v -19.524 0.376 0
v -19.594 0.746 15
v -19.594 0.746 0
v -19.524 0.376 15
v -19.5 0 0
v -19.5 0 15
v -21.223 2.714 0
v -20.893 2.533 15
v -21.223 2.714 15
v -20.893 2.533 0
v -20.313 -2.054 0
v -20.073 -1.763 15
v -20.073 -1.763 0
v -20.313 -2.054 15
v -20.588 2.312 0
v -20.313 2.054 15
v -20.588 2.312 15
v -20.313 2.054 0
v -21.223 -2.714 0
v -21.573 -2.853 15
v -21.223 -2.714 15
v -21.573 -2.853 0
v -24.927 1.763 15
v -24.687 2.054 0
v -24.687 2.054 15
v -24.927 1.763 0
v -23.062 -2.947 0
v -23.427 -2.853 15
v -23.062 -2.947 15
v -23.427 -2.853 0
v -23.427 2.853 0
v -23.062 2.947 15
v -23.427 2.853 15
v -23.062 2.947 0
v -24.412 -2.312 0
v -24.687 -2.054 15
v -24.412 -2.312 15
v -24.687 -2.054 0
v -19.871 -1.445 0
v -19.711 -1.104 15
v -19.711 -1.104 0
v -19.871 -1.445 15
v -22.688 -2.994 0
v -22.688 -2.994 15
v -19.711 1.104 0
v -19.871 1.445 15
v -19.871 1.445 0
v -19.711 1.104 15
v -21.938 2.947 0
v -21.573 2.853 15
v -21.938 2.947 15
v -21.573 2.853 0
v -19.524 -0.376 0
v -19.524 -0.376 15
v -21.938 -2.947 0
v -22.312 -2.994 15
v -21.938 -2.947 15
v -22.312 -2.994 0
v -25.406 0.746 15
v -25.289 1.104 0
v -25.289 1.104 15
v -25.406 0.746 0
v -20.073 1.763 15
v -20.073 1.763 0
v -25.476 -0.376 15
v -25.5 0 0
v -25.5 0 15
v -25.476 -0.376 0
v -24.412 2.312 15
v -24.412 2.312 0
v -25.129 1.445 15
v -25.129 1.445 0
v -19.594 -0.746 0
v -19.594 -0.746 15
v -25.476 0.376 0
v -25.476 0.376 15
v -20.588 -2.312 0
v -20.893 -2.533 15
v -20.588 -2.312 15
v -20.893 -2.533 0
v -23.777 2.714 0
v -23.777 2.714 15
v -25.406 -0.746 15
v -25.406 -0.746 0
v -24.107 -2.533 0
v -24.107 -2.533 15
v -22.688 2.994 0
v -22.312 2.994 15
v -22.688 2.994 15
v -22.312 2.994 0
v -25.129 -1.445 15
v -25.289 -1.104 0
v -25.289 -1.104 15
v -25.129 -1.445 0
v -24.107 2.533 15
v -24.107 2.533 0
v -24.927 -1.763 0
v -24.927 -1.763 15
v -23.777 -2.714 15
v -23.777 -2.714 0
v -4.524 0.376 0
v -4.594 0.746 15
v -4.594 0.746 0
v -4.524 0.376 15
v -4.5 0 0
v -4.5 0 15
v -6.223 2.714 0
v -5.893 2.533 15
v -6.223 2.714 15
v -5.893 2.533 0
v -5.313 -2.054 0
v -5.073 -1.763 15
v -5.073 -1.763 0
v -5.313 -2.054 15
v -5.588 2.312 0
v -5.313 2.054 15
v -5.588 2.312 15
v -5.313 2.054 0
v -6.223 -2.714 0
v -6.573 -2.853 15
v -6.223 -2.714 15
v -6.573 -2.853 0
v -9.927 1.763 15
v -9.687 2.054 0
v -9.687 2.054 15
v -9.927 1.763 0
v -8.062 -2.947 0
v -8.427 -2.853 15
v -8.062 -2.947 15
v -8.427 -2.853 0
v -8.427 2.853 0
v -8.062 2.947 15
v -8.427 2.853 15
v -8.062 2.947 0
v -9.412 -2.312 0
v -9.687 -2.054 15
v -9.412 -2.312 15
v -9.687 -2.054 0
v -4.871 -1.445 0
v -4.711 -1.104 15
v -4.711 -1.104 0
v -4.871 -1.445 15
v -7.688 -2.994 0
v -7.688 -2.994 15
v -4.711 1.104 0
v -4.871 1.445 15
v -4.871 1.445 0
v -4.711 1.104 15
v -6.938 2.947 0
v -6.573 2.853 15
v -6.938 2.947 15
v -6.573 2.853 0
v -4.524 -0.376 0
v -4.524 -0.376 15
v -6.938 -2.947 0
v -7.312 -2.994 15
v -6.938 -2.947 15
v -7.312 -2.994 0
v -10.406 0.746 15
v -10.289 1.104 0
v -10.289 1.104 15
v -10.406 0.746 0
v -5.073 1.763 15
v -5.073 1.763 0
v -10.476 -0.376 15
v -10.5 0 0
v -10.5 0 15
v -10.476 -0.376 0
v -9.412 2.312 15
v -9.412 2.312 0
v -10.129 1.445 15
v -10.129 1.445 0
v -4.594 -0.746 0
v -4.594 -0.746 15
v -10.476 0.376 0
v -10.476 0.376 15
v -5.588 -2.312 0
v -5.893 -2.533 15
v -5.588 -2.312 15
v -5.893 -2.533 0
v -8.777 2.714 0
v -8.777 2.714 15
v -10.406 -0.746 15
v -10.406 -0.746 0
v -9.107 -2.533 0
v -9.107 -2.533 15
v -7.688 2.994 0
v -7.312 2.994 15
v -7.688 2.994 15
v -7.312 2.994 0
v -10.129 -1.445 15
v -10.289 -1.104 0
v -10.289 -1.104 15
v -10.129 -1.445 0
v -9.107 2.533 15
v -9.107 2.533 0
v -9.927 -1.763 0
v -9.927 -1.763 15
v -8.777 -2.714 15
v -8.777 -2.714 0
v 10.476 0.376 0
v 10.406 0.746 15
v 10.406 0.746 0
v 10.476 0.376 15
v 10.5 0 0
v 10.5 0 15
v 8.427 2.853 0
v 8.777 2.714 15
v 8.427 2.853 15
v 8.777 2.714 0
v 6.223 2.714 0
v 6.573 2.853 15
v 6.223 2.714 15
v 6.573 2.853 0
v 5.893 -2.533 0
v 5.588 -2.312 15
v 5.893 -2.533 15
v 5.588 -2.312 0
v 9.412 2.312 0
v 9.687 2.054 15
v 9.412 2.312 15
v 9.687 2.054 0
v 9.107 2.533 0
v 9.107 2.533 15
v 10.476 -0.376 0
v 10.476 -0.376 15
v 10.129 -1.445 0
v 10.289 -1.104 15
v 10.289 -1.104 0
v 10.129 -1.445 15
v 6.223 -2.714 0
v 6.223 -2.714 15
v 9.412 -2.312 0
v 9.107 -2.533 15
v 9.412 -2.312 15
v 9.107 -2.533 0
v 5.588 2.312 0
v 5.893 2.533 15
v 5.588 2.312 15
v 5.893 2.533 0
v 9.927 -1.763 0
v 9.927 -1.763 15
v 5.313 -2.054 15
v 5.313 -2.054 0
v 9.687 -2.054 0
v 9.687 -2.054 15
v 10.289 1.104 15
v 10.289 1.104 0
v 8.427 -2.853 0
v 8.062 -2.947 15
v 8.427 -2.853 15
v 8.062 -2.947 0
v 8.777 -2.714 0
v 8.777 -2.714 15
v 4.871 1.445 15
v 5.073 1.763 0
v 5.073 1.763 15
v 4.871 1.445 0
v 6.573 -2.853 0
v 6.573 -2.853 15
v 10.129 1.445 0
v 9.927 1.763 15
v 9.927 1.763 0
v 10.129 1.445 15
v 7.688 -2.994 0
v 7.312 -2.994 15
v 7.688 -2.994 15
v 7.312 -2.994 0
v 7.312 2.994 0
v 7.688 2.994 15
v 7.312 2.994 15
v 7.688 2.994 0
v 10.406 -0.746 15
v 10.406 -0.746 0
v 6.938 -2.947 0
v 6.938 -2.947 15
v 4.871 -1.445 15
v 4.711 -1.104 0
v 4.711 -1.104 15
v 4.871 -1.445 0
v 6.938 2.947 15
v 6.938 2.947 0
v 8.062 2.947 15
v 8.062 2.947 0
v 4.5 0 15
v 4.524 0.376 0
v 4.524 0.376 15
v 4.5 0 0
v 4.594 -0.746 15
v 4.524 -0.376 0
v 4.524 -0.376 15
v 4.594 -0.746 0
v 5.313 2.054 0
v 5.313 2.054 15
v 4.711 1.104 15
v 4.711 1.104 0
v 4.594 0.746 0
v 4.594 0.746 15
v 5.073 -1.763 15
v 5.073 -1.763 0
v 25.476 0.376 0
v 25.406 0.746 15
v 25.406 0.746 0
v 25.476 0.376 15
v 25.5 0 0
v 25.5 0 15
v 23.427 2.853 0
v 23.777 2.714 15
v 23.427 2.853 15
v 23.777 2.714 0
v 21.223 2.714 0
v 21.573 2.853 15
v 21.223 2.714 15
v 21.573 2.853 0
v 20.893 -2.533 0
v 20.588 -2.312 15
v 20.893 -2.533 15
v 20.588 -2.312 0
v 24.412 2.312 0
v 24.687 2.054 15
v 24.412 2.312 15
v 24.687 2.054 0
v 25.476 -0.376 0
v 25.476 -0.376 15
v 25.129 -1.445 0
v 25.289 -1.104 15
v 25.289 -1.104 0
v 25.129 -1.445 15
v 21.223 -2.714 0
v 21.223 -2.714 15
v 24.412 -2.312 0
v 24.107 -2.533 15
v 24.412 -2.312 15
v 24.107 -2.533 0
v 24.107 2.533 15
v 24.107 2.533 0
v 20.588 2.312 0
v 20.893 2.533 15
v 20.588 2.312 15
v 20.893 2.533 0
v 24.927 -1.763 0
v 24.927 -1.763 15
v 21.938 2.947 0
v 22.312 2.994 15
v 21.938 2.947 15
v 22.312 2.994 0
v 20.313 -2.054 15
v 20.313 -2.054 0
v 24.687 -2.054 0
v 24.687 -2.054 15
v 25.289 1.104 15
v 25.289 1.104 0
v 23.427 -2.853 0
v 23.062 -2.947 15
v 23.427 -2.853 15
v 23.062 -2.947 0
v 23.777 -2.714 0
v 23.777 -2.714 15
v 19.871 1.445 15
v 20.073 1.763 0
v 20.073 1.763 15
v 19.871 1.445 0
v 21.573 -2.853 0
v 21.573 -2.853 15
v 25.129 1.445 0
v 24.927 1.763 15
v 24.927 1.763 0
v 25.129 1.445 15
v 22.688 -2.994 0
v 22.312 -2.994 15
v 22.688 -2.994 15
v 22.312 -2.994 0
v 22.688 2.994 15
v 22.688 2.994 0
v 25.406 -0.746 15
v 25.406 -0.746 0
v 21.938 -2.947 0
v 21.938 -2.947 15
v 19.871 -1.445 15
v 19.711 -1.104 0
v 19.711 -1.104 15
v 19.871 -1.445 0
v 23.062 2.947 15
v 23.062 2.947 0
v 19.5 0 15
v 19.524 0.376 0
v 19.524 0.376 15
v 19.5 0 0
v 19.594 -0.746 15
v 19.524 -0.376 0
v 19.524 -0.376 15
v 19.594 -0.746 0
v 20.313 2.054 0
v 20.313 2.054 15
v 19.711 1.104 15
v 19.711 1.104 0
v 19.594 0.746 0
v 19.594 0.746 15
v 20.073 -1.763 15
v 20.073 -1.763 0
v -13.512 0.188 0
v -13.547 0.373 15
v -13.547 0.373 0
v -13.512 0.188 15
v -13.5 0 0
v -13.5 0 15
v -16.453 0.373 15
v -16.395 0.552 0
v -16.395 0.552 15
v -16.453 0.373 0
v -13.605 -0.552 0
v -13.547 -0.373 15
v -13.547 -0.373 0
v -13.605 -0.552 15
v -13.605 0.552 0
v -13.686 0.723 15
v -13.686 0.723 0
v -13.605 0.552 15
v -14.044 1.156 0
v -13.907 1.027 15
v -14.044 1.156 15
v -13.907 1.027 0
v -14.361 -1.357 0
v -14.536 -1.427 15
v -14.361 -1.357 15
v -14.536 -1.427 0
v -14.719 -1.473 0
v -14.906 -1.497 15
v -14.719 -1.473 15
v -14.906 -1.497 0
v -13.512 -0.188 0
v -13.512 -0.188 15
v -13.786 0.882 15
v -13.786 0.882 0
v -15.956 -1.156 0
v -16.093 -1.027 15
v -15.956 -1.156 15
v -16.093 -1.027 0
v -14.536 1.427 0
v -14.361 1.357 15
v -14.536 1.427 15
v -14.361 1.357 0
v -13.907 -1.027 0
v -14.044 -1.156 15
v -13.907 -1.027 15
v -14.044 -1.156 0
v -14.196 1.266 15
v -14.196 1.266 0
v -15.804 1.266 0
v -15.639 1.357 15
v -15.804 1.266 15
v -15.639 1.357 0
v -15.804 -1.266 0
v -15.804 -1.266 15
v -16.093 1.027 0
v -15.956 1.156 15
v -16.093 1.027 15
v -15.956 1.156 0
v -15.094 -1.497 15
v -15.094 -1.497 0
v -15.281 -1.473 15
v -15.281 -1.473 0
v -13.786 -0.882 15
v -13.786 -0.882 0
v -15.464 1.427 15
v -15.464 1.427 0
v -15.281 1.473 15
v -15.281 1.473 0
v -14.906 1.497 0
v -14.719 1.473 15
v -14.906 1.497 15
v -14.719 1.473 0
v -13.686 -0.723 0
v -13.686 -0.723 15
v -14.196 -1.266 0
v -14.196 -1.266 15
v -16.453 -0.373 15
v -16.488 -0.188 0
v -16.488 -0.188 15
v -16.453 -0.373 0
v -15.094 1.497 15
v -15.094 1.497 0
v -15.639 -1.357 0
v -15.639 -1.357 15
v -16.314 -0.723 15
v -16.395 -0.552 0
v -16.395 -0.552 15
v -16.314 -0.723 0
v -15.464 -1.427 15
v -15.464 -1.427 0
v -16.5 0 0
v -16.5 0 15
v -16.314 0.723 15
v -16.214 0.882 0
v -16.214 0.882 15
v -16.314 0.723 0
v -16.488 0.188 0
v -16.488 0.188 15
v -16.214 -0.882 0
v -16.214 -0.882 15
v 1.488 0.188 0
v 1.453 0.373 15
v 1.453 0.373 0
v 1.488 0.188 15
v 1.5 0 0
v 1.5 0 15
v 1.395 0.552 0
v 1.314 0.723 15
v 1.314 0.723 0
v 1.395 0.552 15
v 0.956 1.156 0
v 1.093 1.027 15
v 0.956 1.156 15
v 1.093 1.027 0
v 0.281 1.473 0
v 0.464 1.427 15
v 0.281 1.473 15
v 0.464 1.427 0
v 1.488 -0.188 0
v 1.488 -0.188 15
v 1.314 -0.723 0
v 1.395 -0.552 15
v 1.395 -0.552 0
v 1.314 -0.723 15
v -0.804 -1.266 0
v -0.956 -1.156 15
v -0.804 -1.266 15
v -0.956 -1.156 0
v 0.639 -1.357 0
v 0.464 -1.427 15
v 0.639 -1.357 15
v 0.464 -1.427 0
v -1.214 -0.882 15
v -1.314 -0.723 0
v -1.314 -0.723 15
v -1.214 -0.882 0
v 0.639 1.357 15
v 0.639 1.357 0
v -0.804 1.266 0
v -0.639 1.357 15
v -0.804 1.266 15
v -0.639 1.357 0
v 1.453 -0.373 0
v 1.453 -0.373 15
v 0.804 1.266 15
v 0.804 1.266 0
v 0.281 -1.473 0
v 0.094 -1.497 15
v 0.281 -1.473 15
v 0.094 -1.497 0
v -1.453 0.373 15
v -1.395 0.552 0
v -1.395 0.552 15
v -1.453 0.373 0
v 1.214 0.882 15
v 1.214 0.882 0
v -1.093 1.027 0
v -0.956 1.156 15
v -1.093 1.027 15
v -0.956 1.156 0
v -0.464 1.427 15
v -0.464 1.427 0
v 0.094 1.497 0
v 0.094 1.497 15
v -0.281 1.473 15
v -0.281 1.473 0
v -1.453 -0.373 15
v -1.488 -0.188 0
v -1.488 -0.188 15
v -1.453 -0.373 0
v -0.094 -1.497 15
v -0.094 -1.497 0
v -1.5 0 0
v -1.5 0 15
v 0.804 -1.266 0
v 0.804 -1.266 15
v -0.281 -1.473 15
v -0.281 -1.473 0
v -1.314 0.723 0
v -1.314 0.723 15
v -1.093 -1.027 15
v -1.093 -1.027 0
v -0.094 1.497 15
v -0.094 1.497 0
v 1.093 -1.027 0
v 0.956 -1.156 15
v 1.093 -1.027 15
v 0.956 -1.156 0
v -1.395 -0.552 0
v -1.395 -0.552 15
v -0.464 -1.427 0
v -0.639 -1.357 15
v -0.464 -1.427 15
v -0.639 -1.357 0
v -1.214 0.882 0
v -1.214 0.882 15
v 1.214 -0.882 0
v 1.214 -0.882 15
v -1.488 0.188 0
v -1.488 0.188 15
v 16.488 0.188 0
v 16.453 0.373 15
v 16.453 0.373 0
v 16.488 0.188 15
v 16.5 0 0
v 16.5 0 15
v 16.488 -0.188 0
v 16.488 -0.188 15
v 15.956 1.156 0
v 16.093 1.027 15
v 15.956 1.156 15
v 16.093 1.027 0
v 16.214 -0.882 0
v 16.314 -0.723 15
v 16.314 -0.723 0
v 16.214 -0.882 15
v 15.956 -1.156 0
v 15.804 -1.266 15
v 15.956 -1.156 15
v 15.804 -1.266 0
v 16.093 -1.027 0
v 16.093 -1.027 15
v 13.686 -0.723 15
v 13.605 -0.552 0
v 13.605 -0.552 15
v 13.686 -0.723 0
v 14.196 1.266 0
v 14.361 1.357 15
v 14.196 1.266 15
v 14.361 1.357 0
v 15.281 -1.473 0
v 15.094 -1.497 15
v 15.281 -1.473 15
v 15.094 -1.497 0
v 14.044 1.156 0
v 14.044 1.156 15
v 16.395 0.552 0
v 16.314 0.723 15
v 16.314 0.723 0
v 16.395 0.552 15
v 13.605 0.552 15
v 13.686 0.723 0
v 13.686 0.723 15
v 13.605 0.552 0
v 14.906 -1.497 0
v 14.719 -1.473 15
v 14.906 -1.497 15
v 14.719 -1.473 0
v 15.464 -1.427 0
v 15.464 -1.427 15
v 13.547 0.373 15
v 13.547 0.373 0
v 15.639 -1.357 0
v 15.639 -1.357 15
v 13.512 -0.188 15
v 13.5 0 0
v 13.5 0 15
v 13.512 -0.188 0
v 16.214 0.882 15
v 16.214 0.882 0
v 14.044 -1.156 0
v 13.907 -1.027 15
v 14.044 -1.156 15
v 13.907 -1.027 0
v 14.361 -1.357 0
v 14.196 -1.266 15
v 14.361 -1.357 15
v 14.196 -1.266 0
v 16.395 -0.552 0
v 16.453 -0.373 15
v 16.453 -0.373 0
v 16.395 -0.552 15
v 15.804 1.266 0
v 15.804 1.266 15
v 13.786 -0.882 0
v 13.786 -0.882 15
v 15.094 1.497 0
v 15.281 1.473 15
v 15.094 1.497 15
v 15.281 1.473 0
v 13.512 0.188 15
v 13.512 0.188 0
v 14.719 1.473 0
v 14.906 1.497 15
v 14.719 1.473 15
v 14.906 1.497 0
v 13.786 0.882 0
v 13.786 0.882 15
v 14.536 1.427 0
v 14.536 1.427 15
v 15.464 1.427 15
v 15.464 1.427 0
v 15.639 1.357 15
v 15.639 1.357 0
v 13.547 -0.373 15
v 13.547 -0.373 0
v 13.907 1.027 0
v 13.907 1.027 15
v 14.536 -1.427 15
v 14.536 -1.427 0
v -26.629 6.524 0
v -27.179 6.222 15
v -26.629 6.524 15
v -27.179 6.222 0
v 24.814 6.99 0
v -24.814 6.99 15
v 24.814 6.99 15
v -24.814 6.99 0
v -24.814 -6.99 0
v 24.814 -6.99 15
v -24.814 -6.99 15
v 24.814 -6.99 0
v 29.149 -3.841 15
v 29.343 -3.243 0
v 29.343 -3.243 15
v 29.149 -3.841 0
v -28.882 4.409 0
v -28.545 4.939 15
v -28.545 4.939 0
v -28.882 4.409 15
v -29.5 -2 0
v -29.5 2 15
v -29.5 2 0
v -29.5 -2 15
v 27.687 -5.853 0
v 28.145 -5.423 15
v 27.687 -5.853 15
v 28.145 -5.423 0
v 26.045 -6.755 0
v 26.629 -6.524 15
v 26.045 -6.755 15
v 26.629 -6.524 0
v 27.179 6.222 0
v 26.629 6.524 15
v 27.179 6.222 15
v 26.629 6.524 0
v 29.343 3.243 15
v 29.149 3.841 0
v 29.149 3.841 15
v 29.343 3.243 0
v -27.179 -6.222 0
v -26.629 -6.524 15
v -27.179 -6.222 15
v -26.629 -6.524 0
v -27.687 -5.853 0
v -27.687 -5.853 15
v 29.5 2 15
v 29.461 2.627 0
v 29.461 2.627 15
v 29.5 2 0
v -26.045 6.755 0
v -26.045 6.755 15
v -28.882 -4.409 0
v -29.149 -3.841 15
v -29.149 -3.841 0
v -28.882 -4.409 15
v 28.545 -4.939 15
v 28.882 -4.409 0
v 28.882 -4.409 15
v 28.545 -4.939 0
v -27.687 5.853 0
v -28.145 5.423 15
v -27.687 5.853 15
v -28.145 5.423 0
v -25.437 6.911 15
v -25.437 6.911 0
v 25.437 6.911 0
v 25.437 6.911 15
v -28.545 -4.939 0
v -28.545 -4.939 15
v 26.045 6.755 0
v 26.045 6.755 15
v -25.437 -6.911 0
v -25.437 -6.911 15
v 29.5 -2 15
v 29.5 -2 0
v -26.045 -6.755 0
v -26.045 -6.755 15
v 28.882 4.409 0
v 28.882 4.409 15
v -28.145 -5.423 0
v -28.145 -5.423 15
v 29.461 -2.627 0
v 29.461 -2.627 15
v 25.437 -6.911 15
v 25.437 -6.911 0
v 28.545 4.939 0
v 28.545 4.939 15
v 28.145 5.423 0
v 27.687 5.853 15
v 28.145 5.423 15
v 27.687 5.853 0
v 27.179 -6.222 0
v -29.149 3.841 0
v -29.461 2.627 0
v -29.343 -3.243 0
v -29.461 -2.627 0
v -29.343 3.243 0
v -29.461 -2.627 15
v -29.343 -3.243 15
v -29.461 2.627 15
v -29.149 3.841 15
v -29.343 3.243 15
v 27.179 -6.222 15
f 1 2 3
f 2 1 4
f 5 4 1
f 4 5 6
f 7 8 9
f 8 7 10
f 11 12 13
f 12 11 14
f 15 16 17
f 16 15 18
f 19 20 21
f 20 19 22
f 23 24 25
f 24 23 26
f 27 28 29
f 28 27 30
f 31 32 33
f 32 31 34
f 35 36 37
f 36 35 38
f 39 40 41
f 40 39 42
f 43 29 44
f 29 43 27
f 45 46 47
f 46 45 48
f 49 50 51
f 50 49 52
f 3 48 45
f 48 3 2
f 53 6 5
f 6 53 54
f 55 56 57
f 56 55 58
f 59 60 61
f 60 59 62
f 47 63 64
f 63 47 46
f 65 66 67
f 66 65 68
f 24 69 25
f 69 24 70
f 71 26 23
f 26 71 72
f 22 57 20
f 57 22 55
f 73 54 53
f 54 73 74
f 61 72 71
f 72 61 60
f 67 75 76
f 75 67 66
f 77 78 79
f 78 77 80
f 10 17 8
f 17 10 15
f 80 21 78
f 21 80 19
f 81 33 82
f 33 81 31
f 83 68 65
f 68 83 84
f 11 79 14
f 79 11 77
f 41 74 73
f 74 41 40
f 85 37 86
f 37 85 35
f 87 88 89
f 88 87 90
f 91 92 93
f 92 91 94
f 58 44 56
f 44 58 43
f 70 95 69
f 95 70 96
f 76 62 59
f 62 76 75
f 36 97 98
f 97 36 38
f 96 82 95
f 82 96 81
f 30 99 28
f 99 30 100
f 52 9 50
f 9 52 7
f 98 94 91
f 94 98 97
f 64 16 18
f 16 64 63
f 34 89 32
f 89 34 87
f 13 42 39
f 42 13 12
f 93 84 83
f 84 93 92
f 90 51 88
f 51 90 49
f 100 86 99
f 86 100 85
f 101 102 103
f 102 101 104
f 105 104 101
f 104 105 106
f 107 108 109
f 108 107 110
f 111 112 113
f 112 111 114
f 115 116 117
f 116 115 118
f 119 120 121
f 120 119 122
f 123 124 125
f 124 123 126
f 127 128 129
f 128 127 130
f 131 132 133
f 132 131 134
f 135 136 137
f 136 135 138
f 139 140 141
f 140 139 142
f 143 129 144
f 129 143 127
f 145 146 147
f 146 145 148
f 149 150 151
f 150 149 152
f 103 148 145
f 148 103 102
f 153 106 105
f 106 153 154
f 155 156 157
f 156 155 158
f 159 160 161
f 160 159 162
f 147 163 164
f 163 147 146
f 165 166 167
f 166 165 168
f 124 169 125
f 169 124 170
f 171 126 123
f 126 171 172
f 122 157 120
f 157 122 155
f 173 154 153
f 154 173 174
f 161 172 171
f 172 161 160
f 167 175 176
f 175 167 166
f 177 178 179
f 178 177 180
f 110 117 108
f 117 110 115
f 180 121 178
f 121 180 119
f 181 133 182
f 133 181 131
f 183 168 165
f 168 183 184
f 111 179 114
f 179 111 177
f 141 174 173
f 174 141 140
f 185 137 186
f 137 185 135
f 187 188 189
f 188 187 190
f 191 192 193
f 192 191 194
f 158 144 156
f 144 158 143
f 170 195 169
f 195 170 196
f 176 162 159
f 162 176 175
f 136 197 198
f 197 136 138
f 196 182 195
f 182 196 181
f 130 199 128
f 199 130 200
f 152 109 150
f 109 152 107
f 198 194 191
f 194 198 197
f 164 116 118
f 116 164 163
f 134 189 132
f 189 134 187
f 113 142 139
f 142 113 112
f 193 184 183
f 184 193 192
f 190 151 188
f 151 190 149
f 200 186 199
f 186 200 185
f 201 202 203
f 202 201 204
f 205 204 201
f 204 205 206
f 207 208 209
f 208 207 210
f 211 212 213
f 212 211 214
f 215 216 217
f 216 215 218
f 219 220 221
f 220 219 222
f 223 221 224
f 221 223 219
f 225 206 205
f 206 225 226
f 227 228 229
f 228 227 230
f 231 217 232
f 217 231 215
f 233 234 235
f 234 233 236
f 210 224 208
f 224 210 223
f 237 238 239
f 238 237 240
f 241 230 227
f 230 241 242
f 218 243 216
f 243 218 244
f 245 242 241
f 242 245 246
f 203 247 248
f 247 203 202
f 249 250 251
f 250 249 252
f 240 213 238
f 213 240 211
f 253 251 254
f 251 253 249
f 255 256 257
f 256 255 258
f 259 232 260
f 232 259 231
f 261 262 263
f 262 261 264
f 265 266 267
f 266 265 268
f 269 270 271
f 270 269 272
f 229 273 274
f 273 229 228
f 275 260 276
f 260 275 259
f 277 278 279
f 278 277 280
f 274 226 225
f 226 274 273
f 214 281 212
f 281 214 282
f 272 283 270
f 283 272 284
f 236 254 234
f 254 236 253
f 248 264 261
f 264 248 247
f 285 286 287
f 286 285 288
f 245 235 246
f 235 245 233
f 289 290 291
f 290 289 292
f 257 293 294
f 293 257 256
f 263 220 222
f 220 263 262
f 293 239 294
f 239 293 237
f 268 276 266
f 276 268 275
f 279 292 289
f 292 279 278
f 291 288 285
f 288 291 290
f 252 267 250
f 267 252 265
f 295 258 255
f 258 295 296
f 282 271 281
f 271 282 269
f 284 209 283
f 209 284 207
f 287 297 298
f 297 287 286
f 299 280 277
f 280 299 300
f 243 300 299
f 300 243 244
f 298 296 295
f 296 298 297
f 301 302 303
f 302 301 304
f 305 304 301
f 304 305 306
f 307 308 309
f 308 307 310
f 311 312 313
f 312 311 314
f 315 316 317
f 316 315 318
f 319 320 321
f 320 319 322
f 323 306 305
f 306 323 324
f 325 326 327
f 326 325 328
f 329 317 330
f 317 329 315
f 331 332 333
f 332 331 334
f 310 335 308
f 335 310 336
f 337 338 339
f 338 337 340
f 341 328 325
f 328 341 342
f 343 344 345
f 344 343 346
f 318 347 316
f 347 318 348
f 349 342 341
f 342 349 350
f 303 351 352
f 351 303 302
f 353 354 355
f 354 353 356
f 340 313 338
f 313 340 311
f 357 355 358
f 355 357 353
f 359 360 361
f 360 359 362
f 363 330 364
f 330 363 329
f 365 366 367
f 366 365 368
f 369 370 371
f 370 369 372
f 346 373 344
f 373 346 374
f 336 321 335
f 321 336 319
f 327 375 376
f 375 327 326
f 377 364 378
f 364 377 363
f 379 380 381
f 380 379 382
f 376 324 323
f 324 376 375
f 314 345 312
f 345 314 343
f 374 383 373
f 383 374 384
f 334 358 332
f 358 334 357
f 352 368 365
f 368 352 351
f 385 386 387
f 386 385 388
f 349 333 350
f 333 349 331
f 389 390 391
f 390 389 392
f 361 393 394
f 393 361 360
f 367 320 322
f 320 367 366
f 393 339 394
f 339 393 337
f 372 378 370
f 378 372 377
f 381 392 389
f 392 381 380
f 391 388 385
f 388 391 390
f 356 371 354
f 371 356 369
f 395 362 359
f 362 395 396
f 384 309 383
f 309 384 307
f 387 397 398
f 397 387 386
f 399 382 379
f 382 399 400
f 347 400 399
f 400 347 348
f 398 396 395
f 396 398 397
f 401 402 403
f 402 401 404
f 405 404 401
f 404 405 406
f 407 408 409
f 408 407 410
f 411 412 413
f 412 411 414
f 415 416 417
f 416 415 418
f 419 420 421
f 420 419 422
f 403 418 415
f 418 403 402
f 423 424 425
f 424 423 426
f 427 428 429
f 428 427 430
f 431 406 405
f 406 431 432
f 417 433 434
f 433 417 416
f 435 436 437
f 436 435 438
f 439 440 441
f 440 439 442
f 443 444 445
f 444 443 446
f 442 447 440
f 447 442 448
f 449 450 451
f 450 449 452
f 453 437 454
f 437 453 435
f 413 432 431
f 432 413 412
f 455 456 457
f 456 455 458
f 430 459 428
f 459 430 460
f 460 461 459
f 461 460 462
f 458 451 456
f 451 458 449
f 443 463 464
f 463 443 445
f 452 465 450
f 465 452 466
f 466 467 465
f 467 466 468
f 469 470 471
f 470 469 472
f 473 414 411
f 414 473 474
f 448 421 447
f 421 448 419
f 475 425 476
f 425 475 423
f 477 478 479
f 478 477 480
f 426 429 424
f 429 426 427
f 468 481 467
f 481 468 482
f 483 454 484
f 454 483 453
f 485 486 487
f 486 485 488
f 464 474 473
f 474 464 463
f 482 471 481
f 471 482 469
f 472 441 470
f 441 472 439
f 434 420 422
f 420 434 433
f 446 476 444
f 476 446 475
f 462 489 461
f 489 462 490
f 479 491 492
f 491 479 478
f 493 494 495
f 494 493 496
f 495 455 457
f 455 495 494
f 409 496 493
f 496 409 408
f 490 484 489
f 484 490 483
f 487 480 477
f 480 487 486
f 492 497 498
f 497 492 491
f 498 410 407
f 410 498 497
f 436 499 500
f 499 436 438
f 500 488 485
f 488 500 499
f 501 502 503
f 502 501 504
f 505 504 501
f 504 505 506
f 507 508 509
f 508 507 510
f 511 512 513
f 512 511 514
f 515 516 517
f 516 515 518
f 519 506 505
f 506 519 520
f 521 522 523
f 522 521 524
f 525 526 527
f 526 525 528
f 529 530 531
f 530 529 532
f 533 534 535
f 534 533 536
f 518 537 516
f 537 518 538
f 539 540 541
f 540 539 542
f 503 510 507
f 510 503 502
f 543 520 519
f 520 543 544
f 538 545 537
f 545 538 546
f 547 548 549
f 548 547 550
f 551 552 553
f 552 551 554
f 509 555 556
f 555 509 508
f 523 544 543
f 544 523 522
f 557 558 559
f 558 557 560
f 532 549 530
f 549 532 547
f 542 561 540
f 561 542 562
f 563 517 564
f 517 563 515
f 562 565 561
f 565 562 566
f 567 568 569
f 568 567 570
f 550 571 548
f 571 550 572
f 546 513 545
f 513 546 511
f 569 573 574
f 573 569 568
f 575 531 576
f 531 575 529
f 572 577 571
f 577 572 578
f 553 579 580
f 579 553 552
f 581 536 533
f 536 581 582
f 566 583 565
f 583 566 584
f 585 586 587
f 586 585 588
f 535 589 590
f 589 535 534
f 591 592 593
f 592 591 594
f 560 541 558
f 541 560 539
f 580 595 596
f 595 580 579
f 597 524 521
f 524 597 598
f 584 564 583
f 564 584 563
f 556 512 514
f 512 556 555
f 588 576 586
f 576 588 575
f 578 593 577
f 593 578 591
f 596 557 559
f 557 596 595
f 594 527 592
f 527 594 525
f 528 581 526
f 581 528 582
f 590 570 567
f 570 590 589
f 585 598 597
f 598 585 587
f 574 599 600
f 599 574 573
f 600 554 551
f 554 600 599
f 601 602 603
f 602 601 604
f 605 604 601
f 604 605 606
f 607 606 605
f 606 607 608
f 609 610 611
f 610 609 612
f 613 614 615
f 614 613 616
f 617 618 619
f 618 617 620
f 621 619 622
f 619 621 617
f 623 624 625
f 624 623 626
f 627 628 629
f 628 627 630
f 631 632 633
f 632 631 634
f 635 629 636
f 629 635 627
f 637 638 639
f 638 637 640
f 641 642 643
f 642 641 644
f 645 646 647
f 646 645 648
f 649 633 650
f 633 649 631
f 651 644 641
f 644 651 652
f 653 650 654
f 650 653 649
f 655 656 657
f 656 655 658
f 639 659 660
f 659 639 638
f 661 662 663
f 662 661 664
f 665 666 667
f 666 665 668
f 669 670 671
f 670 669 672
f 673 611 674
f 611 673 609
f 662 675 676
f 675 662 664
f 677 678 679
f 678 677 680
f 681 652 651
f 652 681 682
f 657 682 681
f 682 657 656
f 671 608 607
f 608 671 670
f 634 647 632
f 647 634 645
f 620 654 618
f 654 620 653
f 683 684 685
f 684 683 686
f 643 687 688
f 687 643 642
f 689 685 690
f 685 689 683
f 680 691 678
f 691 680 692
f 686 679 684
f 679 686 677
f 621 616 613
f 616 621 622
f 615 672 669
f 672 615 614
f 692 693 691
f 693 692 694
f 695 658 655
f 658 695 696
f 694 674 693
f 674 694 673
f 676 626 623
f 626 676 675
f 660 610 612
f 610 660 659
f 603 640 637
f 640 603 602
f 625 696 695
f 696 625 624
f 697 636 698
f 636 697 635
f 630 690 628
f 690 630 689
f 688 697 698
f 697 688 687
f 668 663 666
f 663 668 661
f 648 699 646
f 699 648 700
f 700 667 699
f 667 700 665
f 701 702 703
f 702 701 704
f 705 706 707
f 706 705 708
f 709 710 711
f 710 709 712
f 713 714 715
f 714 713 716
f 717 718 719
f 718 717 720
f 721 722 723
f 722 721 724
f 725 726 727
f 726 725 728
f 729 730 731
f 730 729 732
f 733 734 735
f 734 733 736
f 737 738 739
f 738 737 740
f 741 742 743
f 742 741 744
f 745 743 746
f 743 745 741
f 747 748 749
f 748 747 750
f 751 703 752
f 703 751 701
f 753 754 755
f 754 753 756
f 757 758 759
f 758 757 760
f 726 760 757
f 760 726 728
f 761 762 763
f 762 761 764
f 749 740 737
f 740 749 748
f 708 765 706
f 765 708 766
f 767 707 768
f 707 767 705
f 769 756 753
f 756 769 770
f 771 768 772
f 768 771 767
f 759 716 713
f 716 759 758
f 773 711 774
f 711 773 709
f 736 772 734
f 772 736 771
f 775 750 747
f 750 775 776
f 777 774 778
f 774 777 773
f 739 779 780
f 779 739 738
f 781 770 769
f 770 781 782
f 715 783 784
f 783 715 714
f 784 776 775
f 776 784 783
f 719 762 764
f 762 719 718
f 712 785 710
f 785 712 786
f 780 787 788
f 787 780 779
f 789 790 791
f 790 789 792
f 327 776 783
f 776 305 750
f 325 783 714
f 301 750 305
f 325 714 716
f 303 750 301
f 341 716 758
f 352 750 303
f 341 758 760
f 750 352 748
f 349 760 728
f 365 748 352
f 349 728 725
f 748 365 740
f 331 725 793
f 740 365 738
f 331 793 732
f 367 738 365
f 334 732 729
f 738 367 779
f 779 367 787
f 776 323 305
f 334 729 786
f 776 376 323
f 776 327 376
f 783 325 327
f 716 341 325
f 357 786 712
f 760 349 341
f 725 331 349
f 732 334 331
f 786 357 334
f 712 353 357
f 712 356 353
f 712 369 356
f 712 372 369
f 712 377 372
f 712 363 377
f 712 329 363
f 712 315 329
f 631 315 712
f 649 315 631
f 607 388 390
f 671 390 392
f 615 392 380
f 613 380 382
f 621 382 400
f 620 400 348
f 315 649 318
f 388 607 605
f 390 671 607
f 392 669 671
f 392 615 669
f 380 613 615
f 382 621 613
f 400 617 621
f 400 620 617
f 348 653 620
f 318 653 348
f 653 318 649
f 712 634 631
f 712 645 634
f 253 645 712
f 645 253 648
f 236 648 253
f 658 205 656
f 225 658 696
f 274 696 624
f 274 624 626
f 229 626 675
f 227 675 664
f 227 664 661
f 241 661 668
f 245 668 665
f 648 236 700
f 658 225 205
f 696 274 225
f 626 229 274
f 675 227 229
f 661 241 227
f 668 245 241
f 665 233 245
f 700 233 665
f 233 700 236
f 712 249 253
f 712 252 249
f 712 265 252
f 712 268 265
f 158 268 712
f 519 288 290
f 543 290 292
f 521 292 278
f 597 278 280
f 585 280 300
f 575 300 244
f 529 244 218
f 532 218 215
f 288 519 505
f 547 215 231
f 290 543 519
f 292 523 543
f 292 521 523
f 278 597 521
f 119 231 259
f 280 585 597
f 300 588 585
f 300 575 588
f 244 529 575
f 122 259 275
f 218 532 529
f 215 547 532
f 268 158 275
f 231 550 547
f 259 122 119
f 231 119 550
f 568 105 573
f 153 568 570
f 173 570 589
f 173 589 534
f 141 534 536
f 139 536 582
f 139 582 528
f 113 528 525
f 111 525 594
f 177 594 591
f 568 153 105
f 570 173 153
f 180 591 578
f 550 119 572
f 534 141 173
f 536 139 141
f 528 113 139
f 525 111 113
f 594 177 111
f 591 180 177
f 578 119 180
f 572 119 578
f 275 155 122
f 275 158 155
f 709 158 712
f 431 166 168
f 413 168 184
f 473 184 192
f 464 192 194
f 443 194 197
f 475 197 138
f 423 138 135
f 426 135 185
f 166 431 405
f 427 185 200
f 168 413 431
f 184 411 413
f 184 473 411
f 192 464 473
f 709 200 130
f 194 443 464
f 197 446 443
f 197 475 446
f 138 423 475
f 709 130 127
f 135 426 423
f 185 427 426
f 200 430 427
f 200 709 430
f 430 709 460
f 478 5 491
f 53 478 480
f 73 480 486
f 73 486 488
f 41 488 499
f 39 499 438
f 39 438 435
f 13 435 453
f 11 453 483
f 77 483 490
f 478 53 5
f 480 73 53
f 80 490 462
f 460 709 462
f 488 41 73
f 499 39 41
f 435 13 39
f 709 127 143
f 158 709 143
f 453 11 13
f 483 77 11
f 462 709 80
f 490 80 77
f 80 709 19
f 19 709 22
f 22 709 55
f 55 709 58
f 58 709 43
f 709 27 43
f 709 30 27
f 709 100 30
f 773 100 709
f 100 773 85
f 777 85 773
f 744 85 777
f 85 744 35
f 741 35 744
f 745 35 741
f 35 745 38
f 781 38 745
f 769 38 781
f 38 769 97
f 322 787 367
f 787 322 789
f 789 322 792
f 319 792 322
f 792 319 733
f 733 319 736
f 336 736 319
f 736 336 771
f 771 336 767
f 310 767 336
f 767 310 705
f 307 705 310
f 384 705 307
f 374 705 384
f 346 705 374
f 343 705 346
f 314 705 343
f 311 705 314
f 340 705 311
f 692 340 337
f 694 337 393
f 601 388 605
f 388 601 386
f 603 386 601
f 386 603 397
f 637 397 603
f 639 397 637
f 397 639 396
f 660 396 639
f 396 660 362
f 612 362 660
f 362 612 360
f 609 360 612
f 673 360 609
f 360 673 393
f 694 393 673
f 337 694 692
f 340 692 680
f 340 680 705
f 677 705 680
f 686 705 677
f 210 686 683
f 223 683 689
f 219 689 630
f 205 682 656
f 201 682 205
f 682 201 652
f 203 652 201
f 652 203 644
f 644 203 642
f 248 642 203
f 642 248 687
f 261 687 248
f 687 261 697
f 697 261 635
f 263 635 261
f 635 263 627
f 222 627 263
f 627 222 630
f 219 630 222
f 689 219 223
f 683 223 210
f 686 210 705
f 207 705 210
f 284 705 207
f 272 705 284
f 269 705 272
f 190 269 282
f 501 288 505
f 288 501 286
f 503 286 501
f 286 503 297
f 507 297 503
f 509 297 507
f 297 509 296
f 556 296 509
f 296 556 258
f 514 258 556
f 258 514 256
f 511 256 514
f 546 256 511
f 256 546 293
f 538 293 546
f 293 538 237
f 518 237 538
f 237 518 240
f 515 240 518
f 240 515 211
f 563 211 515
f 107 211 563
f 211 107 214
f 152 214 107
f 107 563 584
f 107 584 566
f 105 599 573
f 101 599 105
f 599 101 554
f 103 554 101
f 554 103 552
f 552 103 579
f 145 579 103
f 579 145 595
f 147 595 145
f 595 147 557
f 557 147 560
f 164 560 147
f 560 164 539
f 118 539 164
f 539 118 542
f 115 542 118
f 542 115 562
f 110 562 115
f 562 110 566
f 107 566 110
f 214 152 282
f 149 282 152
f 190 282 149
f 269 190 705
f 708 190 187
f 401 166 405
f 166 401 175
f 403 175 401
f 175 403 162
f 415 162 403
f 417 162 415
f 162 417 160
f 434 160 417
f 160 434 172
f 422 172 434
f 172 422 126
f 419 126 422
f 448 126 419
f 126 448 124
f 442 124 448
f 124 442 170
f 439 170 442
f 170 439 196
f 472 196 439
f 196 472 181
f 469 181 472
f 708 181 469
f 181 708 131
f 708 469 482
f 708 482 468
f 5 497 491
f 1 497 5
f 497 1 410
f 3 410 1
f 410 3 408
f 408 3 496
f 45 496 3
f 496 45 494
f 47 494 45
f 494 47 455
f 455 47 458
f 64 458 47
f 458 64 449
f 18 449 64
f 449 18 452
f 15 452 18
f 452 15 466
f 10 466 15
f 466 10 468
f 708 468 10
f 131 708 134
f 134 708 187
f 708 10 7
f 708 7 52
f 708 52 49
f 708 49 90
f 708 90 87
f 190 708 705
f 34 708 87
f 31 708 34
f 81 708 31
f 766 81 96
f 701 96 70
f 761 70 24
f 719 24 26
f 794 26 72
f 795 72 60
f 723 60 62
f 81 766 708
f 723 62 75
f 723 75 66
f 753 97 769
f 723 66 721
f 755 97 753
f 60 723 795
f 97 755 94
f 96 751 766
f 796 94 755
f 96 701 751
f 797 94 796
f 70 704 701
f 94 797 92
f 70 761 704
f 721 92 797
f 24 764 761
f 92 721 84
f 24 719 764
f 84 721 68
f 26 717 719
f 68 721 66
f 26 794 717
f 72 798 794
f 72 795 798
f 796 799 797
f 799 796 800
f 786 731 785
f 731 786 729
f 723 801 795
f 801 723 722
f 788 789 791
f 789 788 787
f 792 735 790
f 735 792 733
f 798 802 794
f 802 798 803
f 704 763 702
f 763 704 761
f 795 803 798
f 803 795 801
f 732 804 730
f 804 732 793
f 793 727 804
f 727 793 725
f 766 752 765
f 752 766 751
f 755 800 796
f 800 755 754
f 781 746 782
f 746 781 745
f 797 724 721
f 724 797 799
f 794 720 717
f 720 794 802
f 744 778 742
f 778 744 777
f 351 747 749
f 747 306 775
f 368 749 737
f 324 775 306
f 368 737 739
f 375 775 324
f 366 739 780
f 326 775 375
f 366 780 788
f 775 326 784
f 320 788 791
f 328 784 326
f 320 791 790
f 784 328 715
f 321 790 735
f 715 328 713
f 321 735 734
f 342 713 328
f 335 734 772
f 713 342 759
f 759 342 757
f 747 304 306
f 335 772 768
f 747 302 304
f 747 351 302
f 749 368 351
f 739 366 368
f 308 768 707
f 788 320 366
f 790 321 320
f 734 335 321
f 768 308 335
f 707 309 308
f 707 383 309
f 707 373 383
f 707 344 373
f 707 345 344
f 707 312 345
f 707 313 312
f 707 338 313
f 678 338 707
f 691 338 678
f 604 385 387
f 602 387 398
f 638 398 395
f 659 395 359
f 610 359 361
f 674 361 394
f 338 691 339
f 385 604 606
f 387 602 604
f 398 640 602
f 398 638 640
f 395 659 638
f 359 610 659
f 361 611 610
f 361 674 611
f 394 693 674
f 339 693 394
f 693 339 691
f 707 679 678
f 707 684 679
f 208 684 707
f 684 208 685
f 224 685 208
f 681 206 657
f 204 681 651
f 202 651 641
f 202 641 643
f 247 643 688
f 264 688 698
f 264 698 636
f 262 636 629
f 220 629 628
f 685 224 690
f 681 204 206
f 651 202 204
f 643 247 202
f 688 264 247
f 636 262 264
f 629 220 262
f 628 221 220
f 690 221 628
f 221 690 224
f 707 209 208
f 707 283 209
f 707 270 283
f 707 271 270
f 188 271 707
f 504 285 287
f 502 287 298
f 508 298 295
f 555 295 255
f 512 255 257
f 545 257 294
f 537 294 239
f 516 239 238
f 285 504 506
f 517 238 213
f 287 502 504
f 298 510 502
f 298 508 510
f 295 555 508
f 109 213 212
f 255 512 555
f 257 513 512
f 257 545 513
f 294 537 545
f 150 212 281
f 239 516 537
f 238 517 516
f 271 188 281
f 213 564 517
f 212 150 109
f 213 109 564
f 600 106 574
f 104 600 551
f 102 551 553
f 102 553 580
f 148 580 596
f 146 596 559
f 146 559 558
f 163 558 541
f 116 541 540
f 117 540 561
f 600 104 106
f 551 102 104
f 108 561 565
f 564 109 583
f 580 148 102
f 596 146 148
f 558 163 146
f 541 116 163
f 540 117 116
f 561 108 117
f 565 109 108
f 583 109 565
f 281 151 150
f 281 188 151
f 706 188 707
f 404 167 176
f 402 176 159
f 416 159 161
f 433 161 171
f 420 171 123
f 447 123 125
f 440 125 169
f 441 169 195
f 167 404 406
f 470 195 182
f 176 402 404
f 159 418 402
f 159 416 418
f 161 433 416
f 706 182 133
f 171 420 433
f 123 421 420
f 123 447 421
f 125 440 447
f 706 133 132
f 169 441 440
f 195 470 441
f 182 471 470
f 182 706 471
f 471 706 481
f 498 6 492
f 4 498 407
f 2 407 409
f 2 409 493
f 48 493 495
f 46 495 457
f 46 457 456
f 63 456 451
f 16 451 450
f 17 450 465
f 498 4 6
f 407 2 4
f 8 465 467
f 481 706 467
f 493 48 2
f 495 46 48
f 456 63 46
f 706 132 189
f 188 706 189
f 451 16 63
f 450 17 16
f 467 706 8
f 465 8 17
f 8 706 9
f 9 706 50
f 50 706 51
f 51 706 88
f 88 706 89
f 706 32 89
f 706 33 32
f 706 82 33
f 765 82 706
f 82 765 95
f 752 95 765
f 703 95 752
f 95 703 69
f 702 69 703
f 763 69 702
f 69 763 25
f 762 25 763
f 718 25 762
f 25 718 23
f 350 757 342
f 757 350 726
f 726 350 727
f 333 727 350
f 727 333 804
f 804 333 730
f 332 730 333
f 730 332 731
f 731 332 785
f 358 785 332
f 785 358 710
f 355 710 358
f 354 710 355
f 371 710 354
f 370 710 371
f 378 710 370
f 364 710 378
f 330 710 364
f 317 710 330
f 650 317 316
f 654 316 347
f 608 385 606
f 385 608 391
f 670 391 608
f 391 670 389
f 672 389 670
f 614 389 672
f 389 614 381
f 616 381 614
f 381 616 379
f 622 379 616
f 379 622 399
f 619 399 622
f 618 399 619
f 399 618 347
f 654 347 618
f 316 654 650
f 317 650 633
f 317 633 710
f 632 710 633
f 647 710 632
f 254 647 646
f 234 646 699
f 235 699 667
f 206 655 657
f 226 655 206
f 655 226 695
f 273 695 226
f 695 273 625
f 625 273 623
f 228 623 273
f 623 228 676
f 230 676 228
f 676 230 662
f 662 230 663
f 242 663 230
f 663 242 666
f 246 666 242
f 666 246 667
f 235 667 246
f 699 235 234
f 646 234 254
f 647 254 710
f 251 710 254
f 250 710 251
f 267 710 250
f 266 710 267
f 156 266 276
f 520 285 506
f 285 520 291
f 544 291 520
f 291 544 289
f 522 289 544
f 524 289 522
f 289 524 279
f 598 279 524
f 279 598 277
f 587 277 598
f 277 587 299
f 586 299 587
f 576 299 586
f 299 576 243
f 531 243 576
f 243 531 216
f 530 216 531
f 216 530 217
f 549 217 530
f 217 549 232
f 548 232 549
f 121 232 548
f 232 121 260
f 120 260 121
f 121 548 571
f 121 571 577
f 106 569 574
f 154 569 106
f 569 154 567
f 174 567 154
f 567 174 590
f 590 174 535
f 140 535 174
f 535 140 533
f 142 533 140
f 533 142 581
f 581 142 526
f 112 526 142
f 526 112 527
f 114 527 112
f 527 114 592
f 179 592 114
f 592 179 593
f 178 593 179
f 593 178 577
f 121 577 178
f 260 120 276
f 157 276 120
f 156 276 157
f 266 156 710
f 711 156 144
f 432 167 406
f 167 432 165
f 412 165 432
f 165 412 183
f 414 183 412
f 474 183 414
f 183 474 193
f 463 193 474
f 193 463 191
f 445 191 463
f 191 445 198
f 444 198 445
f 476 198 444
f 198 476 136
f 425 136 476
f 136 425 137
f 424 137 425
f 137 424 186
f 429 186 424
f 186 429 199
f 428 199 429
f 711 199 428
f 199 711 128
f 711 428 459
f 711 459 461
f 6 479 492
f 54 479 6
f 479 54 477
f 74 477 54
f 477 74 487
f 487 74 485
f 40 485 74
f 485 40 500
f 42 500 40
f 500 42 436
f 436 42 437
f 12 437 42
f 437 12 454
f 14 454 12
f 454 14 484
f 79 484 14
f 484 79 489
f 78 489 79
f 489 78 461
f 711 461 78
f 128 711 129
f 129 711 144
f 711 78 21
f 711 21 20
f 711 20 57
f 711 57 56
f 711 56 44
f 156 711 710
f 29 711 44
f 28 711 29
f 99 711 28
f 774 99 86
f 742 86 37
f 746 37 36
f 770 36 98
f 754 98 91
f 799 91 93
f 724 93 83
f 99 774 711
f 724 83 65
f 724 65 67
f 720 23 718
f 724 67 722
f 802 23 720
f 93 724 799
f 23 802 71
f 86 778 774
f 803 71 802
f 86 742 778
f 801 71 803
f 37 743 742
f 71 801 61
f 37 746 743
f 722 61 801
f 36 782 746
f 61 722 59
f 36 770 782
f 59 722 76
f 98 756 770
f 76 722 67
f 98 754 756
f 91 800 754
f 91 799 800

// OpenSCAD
$fn = 50;


difference() {
	union() {
		*color(alpha = 1.0000000000, c = "gray") {
			translate(v = [0, 7, 0]) {
				linear_extrude(height = 1) {
					text(font = "Arial:style=Bold", halign = "center", size = 4.5000000000, text = "COMMENT plate main", valign = "center");
				}
			}
		}
		*color(alpha = 1.0000000000, c = "gray") {
			translate(v = [0, 14, 0]) {
				linear_extrude(height = 1) {
					text(font = "Arial:style=Bold", halign = "center", size = 4.5000000000, text = "COMMENT description oobb_plate_shape_p_type_15_depth_4_width_1_height_15_thickness_true_both_holes", valign = "center");
				}
			}
		}
		hull() {
			translate(v = [-24.5000000000, 2.0000000000, 0]) {
				cylinder(h = 15, r = 5);
			}
			translate(v = [24.5000000000, 2.0000000000, 0]) {
				cylinder(h = 15, r = 5);
			}
			translate(v = [-24.5000000000, -2.0000000000, 0]) {
				cylinder(h = 15, r = 5);
			}
			translate(v = [24.5000000000, -2.0000000000, 0]) {
				cylinder(h = 15, r = 5);
			}
		}
	}
	union() {
		*color(alpha = 1.0000000000, c = "gray") {
			translate(v = [0, 7, 0]) {
				linear_extrude(height = 1) {
					text(font = "Arial:style=Bold", halign = "center", size = 4.5000000000, text = "COMMENT holes main", valign = "center");
				}
			}
		}
		*color(alpha = 1.0000000000, c = "gray") {
			translate(v = [0, 14, 0]) {
				linear_extrude(height = 1) {
					text(font = "Arial:style=Bold", halign = "center", size = 4.5000000000, text = "COMMENT description oobb_holes_shape_n_type_4_width_1_height_15_thickness_true_both_holes", valign = "center");
				}
			}
		}
		translate(v = [-22.5000000000, 0.0000000000, 0]) {
			translate(v = [0, 0, -50]) {
				cylinder(h = 100, r = 3.0000000000);
			}
		}
		translate(v = [-7.5000000000, 0.0000000000, 0]) {
			translate(v = [0, 0, -50]) {
				cylinder(h = 100, r = 3.0000000000);
			}
		}
		translate(v = [7.5000000000, 0.0000000000, 0]) {
			translate(v = [0, 0, -50]) {
				cylinder(h = 100, r = 3.0000000000);
			}
		}
		translate(v = [22.5000000000, 0.0000000000, 0]) {
			translate(v = [0, 0, -50]) {
				cylinder(h = 100, r = 3.0000000000);
			}
		}
		translate(v = [-22.5000000000, 0.0000000000, 0]) {
			translate(v = [0, 0, -50]) {
				cylinder(h = 100, r = 1.5000000000);
			}
		}
		translate(v = [-15.0000000000, 0.0000000000, 0]) {
			translate(v = [0, 0, -50]) {
				cylinder(h = 100, r = 1.5000000000);
			}
		}
		translate(v = [-7.5000000000, 0.0000000000, 0]) {
			translate(v = [0, 0, -50]) {
				cylinder(h = 100, r = 1.5000000000);
			}
		}
		translate(v = [0, 0, -50]) {
			cylinder(h = 100, r = 1.5000000000);
		}
		translate(v = [7.5000000000, 0.0000000000, 0]) {
			translate(v = [0, 0, -50]) {
				cylinder(h = 100, r = 1.5000000000);
			}
		}
		translate(v = [15.0000000000, 0.0000000000, 0]) {
			translate(v = [0, 0, -50]) {
				cylinder(h = 100, r = 1.5000000000);
			}
		}
		translate(v = [22.5000000000, 0.0000000000, 0]) {
			translate(v = [0, 0, -50]) {
				cylinder(h = 100, r = 1.5000000000);
			}
		}
	}
}
